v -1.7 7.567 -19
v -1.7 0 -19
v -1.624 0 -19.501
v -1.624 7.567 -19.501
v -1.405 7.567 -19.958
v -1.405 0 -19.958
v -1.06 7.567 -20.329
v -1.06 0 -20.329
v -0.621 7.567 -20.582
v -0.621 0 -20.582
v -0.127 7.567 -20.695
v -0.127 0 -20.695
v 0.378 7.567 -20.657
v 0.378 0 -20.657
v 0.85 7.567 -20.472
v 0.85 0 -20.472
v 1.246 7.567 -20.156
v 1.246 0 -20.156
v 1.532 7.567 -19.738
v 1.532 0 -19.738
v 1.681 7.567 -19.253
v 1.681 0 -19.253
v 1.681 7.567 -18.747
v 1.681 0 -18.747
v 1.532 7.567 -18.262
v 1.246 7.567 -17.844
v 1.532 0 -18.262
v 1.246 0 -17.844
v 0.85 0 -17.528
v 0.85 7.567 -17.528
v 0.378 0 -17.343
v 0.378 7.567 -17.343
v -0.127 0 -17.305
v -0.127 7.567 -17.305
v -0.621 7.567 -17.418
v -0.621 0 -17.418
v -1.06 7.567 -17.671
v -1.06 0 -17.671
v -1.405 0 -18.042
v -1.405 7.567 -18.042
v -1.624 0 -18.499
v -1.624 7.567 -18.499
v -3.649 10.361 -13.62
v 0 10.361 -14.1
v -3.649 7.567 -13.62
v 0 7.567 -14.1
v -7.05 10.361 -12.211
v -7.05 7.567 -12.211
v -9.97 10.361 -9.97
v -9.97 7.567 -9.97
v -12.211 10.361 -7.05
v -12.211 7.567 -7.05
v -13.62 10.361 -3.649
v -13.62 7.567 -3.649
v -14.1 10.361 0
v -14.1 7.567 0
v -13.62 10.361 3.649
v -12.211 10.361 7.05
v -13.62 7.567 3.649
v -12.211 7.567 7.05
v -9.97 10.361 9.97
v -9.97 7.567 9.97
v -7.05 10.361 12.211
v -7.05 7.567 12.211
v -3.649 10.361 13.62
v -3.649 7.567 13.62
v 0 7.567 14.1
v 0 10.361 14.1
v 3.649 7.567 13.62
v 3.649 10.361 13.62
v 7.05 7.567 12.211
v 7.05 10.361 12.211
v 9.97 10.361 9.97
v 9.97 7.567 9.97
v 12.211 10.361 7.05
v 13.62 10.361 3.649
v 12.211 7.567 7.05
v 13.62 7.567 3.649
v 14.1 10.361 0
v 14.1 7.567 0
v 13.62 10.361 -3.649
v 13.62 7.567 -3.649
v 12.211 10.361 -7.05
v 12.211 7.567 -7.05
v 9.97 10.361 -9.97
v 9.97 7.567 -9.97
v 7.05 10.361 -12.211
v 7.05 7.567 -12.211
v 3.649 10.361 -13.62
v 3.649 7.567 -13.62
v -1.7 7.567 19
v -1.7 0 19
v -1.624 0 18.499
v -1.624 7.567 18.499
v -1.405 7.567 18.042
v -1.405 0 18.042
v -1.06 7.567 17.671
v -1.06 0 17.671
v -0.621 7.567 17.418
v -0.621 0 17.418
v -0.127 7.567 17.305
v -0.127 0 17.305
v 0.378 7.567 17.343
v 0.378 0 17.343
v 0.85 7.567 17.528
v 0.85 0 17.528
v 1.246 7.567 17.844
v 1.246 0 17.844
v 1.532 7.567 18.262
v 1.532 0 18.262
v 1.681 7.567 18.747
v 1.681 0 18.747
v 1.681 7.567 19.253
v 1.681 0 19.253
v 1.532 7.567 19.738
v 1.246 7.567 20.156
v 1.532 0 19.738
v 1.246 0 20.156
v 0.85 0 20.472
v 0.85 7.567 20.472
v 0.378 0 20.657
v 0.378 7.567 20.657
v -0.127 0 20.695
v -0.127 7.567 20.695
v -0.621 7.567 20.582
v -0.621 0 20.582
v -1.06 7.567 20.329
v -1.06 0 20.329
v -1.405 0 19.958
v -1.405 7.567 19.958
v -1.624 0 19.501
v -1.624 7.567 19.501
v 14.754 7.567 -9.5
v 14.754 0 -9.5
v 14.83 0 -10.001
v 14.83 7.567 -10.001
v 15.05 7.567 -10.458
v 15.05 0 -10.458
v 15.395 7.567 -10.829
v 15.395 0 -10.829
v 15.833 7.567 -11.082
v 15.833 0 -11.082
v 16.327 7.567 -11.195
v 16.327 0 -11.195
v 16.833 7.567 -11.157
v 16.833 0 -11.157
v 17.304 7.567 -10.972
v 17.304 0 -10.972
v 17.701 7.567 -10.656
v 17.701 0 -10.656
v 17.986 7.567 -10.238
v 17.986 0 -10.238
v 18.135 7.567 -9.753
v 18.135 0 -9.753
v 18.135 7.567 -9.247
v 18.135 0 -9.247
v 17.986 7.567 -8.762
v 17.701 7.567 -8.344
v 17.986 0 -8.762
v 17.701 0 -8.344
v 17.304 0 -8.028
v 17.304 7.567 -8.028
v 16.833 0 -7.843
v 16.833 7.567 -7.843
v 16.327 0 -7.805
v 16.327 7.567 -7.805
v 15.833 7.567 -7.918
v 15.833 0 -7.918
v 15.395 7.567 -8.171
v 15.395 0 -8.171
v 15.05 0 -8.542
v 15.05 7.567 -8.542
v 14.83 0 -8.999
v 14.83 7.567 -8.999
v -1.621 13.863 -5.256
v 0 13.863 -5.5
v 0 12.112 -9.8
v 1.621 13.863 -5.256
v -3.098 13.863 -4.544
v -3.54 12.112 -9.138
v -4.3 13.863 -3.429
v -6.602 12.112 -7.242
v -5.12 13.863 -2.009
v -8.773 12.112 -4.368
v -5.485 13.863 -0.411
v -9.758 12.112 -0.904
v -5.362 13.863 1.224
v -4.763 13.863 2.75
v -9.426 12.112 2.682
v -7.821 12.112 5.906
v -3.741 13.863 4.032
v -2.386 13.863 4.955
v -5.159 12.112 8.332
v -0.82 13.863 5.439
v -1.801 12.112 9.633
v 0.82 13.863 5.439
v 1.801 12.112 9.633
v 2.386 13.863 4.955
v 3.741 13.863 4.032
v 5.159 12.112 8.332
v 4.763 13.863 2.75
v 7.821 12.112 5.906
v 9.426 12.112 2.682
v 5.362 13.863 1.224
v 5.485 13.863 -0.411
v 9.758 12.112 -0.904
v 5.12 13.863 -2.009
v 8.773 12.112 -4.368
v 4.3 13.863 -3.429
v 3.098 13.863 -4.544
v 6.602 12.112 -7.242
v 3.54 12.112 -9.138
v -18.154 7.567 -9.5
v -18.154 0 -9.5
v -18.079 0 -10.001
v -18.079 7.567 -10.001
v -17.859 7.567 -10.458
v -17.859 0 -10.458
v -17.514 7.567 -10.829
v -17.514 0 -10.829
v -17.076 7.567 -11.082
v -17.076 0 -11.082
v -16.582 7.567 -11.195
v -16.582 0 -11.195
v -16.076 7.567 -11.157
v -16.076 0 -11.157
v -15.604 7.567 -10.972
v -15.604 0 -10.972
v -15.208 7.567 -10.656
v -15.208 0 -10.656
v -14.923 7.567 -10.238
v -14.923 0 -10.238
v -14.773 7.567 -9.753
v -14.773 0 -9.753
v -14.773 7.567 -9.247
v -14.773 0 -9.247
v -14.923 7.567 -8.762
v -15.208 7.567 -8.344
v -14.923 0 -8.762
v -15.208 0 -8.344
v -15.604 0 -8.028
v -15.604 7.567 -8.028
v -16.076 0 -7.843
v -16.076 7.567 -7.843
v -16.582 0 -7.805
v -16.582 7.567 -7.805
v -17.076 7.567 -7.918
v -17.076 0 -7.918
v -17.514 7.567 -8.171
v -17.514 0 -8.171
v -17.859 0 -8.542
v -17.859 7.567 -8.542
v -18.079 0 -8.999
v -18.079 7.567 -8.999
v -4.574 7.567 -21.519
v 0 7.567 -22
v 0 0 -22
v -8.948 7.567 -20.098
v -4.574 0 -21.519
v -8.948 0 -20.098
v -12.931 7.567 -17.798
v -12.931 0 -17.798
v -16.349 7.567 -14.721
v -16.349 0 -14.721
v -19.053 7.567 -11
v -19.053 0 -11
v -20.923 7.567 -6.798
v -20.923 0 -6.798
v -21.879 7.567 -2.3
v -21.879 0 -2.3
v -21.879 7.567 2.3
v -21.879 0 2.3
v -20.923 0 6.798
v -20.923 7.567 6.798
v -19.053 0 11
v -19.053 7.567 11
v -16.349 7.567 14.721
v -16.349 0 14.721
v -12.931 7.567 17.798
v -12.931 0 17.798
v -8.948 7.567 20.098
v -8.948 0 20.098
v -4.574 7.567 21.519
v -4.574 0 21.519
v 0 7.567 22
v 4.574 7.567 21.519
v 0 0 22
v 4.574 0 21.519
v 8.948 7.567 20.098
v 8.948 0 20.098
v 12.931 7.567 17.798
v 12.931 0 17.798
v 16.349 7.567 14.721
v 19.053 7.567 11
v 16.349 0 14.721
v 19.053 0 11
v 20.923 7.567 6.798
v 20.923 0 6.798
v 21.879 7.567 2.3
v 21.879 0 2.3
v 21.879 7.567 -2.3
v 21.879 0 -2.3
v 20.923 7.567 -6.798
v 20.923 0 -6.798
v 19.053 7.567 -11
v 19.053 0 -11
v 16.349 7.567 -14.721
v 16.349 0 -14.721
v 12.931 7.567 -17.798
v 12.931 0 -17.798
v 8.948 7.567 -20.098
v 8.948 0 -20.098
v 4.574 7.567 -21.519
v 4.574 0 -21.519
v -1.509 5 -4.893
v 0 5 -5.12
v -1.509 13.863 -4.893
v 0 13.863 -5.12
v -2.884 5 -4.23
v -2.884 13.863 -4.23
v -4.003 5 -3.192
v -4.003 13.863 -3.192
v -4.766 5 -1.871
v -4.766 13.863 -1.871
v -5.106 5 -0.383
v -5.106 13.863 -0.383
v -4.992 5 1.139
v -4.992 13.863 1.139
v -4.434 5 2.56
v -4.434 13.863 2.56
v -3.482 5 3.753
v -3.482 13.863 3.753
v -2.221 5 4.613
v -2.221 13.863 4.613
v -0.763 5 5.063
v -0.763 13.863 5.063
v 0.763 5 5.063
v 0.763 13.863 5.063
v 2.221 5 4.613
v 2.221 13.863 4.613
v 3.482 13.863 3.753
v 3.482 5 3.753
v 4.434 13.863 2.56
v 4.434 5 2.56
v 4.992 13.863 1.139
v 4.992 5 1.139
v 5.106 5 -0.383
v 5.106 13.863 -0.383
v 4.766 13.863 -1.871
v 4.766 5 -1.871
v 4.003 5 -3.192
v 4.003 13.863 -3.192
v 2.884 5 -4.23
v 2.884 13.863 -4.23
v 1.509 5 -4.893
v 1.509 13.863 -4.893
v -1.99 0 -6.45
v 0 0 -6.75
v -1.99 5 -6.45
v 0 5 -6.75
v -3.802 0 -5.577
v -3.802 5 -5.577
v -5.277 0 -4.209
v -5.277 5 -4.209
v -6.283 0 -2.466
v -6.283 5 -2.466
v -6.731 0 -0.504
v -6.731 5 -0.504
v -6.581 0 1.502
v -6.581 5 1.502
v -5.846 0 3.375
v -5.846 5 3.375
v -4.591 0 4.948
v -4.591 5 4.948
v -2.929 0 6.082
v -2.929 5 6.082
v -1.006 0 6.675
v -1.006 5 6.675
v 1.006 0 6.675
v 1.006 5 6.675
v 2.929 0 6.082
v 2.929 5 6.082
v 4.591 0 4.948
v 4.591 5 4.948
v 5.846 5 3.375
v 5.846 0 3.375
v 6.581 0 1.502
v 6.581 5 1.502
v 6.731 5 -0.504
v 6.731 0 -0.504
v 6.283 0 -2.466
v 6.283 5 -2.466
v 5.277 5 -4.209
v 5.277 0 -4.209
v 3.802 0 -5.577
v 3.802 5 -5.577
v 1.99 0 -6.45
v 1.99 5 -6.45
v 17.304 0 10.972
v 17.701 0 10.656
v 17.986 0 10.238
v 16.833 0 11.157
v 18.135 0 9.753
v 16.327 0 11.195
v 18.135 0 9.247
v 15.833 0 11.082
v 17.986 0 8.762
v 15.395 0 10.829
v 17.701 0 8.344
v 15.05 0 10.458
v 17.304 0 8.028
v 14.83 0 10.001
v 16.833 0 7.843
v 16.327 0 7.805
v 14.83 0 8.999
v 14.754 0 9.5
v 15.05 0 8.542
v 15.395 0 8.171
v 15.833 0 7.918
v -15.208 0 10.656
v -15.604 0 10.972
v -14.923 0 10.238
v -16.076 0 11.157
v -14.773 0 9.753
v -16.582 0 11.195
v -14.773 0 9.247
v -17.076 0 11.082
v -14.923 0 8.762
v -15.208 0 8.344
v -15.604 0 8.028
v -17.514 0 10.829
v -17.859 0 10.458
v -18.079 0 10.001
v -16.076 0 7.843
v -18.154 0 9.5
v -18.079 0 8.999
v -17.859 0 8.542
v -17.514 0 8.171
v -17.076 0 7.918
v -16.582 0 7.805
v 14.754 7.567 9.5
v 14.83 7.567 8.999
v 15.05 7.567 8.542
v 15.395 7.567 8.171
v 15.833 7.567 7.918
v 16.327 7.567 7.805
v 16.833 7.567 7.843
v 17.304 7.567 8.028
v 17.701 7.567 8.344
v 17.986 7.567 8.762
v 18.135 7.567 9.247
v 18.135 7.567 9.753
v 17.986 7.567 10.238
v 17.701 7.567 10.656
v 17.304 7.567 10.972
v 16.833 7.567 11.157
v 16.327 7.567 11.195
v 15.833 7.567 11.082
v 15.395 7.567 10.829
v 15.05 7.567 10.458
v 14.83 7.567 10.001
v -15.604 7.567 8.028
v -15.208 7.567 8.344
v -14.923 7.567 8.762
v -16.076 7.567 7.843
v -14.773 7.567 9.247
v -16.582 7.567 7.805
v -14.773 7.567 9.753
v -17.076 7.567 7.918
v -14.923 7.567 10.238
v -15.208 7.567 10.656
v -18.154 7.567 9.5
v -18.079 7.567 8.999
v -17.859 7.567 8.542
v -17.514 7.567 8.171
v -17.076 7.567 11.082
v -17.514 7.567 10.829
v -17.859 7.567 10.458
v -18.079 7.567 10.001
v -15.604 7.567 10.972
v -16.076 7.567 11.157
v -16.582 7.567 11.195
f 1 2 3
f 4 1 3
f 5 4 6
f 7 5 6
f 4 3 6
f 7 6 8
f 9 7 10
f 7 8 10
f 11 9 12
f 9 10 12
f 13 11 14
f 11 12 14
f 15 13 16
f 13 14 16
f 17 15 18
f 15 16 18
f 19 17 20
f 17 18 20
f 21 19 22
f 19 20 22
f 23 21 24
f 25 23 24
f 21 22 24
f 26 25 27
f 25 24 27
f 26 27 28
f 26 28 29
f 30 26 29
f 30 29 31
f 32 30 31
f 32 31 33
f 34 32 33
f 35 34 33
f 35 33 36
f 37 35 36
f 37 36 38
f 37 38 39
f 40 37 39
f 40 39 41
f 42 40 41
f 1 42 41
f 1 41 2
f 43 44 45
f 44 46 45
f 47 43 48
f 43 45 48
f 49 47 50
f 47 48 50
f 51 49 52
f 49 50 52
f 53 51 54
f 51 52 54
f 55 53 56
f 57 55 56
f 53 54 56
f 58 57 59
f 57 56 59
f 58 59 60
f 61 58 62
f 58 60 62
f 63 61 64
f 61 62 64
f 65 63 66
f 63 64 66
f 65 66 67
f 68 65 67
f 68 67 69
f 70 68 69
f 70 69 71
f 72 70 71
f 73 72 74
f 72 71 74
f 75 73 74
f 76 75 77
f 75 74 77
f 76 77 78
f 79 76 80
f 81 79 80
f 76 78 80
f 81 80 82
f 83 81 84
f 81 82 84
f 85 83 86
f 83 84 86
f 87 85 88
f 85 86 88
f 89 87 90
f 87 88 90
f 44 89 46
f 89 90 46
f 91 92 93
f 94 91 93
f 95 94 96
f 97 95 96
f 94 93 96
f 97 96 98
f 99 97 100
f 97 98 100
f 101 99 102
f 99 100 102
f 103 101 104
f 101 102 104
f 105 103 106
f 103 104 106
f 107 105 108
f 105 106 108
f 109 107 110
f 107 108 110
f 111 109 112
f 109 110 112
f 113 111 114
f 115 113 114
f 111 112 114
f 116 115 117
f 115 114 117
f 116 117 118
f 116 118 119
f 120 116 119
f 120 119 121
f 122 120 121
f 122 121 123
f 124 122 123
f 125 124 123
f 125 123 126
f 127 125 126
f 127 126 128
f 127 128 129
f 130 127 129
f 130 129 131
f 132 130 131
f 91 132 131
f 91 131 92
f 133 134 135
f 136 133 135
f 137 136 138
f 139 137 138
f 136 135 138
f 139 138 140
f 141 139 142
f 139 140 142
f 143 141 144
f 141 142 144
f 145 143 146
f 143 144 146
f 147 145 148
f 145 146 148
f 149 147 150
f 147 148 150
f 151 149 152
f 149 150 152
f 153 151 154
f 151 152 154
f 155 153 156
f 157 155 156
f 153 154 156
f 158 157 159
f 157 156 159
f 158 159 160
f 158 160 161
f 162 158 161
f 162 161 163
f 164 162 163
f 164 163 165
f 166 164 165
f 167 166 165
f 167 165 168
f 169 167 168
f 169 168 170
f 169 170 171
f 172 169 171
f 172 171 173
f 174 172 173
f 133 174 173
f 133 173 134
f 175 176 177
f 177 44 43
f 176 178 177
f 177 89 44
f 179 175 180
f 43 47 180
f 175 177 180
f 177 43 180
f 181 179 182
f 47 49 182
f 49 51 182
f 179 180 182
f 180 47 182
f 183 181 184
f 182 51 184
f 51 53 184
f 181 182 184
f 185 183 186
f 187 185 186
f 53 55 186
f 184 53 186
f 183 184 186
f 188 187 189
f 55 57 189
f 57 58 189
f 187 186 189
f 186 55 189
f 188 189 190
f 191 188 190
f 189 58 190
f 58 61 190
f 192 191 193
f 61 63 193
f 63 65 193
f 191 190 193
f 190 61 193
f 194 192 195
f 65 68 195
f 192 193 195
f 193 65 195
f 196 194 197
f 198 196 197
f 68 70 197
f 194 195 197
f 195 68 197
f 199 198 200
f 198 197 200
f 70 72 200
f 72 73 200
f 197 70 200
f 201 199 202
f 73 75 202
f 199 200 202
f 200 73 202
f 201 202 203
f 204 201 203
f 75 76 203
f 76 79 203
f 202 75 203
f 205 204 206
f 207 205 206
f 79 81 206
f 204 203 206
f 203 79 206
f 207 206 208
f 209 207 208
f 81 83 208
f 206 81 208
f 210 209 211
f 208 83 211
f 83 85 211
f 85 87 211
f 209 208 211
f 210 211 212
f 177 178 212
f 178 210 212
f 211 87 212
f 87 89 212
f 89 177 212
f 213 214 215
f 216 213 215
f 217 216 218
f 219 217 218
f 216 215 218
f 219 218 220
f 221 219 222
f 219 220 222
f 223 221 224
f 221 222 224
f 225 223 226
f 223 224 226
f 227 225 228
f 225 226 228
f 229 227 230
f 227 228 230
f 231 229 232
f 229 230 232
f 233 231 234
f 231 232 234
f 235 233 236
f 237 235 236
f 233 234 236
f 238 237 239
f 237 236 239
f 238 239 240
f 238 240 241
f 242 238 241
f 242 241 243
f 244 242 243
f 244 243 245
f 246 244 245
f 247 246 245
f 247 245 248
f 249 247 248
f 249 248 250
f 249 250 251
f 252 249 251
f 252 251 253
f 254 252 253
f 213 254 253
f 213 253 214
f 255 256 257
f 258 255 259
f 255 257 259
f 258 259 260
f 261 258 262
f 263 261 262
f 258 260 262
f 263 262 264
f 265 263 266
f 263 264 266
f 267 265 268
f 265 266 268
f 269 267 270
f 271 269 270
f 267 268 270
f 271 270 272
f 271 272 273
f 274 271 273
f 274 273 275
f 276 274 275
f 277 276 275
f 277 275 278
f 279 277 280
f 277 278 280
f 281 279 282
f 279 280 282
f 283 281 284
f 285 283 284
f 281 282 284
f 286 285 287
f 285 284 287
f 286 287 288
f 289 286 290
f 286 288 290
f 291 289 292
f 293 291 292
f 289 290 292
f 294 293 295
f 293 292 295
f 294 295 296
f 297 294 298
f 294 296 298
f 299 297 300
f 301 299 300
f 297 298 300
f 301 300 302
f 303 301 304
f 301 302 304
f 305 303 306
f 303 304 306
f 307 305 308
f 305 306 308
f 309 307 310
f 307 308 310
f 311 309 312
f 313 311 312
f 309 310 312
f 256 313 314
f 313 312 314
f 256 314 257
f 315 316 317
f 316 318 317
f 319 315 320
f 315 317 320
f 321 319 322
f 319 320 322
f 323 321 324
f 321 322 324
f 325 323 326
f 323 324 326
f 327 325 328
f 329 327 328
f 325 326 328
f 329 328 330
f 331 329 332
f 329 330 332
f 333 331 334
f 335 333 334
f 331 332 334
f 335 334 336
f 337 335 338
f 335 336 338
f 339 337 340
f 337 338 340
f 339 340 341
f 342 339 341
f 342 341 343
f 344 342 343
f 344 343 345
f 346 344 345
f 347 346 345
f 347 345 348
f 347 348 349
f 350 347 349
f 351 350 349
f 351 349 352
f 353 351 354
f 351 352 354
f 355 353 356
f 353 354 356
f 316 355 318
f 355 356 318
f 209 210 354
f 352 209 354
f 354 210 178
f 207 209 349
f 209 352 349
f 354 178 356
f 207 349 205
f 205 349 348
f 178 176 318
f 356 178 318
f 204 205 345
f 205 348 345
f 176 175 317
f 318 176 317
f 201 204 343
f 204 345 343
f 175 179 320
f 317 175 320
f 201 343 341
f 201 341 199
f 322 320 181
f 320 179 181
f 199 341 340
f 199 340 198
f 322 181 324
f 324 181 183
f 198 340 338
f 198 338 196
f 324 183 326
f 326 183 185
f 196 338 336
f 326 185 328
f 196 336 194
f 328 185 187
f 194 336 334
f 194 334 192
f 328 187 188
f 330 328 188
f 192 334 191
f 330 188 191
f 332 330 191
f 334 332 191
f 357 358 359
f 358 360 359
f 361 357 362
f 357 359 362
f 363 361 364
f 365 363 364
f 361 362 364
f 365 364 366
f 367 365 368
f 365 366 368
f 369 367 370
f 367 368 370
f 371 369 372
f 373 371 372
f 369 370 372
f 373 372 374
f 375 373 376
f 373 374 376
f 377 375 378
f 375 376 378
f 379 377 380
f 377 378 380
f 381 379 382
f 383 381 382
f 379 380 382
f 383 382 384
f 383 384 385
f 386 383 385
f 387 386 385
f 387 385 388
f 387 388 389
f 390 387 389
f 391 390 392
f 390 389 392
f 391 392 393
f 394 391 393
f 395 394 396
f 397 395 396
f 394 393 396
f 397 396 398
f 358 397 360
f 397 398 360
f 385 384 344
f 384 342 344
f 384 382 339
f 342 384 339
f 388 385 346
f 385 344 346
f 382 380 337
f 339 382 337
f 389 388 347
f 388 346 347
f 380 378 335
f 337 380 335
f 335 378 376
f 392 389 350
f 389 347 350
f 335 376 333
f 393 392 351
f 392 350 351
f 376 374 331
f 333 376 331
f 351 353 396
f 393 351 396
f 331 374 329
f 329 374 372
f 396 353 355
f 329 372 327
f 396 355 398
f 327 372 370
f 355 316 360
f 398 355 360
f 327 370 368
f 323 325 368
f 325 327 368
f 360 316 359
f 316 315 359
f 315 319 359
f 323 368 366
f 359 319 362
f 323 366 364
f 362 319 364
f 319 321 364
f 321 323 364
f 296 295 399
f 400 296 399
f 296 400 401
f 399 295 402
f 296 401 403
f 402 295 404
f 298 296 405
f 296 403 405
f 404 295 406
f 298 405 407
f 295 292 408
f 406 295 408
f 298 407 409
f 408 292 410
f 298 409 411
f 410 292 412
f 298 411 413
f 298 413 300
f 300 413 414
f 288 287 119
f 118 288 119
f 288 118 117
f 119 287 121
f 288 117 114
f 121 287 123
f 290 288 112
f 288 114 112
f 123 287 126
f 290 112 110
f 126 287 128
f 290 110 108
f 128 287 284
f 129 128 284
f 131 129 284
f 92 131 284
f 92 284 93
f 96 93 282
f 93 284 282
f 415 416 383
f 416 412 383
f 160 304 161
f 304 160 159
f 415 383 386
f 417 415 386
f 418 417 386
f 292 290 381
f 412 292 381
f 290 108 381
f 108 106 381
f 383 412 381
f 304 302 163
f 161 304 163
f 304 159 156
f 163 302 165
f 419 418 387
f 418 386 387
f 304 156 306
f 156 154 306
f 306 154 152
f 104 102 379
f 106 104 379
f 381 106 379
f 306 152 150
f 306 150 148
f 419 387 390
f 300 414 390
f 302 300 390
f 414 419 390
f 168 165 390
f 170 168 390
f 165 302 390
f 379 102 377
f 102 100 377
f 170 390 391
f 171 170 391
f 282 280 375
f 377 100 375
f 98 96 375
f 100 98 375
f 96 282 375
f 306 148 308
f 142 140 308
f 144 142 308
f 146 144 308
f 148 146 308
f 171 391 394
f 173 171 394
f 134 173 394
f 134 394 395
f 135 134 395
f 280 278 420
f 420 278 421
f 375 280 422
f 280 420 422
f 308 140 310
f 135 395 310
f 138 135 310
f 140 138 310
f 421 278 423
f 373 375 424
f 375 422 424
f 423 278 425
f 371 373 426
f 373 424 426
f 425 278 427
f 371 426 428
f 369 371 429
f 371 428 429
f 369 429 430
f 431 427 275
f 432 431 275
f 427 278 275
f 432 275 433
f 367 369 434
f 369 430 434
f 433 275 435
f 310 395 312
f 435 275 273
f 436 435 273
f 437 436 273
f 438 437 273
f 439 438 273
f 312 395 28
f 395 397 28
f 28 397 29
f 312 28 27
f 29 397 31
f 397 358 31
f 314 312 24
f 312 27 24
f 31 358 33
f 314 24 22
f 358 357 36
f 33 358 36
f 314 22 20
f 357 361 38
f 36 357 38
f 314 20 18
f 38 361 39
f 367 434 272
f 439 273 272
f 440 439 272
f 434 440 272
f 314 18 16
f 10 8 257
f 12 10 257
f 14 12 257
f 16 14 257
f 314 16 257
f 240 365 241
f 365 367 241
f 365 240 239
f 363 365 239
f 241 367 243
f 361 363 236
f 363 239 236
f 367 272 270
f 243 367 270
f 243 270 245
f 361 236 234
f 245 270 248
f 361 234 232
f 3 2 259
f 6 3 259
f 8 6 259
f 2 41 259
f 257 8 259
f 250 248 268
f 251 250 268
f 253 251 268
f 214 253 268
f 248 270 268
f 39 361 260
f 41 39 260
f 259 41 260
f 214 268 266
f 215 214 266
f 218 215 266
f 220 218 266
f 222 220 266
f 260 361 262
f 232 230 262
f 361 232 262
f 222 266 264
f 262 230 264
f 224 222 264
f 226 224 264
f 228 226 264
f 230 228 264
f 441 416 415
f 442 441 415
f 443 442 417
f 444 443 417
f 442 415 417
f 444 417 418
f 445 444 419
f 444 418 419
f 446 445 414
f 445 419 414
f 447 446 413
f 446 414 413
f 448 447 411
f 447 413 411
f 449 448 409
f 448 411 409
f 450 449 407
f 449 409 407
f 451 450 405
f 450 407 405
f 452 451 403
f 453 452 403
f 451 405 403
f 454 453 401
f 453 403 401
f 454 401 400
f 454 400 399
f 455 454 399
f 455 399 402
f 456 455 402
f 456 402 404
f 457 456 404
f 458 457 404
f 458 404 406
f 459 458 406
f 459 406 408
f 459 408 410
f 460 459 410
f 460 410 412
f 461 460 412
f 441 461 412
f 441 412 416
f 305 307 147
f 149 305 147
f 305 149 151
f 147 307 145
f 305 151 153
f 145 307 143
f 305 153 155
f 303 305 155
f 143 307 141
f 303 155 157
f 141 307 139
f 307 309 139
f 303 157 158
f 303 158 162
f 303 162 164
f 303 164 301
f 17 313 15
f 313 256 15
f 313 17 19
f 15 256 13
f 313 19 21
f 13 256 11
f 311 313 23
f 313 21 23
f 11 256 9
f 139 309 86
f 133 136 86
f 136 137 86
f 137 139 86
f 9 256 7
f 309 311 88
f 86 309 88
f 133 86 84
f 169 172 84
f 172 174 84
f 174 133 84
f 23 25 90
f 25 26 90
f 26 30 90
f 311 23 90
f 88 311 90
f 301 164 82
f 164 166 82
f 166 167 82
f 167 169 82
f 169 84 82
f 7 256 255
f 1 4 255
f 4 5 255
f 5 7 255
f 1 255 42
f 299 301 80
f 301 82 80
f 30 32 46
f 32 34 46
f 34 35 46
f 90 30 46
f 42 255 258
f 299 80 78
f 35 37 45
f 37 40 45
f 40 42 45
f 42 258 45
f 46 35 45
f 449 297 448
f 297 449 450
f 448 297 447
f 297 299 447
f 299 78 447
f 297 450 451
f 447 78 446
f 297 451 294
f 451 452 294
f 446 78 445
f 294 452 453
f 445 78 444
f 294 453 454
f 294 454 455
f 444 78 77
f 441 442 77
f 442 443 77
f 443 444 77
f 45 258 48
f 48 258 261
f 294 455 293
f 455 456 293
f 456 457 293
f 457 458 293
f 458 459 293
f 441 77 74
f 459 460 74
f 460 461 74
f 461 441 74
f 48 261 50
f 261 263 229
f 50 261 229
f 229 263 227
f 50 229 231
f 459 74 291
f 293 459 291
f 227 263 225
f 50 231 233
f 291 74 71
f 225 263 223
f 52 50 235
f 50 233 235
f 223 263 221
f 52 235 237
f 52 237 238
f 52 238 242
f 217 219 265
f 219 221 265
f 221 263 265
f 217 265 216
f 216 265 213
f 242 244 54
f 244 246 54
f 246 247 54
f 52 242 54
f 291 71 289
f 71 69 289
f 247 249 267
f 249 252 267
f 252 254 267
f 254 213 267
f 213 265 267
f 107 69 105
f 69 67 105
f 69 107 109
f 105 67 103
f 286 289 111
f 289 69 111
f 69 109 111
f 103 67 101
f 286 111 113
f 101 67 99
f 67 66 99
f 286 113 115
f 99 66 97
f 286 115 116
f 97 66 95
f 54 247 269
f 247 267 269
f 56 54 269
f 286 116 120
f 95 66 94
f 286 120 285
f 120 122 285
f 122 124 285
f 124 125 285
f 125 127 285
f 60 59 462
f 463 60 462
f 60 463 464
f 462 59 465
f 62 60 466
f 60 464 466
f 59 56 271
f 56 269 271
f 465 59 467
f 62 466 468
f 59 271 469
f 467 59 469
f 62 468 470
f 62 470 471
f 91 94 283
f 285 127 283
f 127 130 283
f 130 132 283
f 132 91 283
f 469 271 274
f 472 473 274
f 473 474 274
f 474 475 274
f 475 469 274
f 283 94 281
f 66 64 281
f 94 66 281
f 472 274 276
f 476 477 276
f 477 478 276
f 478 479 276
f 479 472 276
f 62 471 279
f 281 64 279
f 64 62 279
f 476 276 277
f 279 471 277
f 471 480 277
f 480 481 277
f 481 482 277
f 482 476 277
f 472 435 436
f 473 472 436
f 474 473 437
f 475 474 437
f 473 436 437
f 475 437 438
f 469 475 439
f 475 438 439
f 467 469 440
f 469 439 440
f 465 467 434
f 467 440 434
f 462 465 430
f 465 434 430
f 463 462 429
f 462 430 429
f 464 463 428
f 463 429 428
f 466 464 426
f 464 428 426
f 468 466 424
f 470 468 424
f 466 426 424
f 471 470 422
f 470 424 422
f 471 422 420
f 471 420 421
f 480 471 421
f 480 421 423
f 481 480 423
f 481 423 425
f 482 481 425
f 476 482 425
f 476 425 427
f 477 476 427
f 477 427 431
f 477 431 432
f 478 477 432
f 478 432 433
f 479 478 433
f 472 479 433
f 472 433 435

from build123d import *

# Parameters (mm, degrees)
M3_CLEARANCE_HOLE1_D     = 3.4
M3_CLEARANCE_HOLE1_DEPTH = 7.5673


with BuildPart() as part:
    # Sketch1 → Revolve1 (revolve)
    with BuildSketch(Plane.XY, mode=Mode.PRIVATE) as revolve1_sk:
        Polygon((5.12, 5), (5.12, 13.8632), (5.5, 13.8632), (14.1, 10.3613), (14.1, 7.5673), (22, 7.5673), (22, 0), (6.75, 0), (6.75, 5), align=None)
    revolve(revolve1_sk.sketch.rotate(Axis((0, 0, 0), (0, 1, 0)), 90), axis=Axis((0, 0, 0), (0, 1, 0)))

    # M3 Clearance Hole1
    with Locations(Plane(origin=(0, 7.5673, 0), x_dir=(1, 0, 0), z_dir=(0, 1, 0))):
        with Locations((0, 19), (16.454482672, 9.5), (16.454482672, -9.5), (0, -19), (-16.454482672, -9.5), (-16.454482672, 9.5), (0, 0)):
            Hole(M3_CLEARANCE_HOLE1_D / 2, depth=M3_CLEARANCE_HOLE1_DEPTH)


solid = part.part
